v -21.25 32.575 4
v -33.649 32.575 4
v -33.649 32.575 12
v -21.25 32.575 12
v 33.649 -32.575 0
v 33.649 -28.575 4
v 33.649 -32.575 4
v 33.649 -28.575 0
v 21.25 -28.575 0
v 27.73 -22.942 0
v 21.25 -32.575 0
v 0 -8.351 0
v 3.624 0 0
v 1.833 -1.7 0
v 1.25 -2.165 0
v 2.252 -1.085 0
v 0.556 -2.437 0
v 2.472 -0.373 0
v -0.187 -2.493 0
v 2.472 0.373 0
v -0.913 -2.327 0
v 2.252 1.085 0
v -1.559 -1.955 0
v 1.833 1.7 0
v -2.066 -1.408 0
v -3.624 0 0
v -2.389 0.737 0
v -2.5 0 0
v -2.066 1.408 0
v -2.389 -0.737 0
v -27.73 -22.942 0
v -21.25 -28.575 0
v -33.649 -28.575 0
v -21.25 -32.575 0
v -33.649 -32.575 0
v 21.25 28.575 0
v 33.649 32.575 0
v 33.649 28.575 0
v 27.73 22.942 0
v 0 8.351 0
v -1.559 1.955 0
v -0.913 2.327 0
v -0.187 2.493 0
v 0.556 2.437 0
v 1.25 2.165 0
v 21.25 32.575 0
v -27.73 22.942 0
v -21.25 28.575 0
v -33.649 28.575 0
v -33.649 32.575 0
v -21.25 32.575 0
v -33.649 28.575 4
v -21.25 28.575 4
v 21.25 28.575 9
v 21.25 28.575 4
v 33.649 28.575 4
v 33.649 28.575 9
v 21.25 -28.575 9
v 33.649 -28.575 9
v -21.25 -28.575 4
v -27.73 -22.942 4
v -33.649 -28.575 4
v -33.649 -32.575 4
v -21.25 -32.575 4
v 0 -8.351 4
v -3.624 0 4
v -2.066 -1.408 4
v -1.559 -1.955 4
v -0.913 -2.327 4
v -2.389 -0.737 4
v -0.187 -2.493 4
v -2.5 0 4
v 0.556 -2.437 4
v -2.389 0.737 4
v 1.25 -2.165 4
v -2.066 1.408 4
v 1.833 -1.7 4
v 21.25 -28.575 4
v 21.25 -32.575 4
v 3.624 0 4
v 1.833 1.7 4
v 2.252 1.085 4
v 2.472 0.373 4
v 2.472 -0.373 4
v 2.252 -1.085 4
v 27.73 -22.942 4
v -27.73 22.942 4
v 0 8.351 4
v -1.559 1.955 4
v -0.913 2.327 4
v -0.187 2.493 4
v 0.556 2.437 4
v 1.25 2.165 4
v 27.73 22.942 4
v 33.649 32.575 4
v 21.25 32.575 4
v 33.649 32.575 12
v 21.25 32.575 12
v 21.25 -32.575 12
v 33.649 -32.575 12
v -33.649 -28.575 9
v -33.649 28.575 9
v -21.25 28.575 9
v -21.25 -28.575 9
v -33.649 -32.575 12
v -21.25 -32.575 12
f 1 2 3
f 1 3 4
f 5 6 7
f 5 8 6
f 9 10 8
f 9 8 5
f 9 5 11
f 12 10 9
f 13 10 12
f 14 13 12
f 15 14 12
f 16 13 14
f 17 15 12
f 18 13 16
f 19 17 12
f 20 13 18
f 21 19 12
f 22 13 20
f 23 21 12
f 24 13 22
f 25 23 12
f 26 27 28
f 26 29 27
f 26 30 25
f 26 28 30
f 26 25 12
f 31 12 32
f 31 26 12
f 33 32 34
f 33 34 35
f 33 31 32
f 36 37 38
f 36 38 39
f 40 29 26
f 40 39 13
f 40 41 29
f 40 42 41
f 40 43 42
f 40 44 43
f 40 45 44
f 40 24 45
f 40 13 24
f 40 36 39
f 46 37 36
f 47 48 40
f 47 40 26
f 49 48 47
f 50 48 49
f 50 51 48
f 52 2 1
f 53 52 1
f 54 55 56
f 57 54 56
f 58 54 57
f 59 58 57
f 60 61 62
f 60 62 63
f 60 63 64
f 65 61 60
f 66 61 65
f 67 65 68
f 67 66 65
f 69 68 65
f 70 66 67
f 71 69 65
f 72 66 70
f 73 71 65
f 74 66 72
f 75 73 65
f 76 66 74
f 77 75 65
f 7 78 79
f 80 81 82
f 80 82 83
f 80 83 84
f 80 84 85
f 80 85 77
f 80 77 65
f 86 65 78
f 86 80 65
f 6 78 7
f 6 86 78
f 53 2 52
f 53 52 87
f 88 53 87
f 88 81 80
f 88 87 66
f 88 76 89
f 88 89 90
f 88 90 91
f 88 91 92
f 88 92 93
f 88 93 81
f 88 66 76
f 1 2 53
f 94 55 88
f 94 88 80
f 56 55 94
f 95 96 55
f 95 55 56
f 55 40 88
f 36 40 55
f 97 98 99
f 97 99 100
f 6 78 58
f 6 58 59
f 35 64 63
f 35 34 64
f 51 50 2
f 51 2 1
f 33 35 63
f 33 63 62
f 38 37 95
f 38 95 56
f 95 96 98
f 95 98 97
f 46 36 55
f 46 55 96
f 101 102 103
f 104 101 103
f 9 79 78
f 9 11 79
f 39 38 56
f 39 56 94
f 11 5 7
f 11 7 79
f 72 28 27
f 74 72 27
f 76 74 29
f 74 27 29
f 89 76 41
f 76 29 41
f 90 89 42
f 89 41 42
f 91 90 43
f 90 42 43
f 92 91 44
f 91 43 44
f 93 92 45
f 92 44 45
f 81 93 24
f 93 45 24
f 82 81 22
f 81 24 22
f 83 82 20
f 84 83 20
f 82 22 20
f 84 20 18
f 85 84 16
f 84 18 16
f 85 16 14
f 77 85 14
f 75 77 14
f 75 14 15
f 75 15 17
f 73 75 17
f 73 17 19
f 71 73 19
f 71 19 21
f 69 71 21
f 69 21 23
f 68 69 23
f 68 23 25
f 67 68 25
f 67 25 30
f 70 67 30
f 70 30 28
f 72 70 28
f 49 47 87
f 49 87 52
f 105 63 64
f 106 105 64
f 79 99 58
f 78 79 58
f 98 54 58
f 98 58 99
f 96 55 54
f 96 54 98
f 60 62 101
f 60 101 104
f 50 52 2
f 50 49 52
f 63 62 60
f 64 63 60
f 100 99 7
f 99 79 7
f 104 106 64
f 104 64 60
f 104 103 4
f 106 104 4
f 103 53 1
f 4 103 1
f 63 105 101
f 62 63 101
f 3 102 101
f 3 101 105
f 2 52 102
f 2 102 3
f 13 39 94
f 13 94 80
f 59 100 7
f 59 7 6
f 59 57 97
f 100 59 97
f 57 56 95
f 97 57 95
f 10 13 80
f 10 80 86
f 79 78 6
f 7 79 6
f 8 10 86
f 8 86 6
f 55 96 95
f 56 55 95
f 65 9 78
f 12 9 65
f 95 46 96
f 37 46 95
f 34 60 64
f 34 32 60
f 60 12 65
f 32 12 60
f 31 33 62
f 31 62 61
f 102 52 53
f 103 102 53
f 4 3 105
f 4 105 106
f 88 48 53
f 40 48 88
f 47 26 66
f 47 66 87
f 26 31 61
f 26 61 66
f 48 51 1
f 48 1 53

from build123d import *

# Parameters (mm, degrees)
DODANIE_WYCI_GNI_CIE1_DEPTH = 4
SZKIC2_W                    = 12.398850507
SZKIC2_H                    = 4
DODANIE_WYCI_GNI_CIE2_DEPTH = 8
SZKIC3_W                    = 12.398850507
SZKIC3_H                    = 65.15
DODANIE_WYCI_GNI_CIE3_DEPTH = 3
SZKIC4_R                    = 2.5
WYTNIJ_WYCI_GNI_CIE1_DEPTH  = 10


with BuildPart() as part:
    # Szkic1 → Dodanie-wyciągnięcie1 (new body)
    with BuildSketch(Plane.XY):
        Polygon((21.25, -28.575), (0, -8.351140655), (-21.25, -28.575), (-21.25, -32.575), (-33.648850507, -32.575), (-33.648850507, -28.575), (-27.730490071, -22.942431105), (-3.623980395, 0), (-27.730490071, 22.942431105), (-33.648850507, 28.575), (-33.648850507, 32.575), (-21.25, 32.575), (-21.25, 28.575), (0, 8.351140655), (21.25, 28.575), (21.25, 32.575), (33.648850507, 32.575), (33.648850507, 28.575), (27.730490071, 22.942431105), (3.623980395, 0), (27.730490071, -22.942431105), (33.648850507, -28.575), (33.648850507, -32.575), (21.25, -32.575), align=None)
    extrude(amount=DODANIE_WYCI_GNI_CIE1_DEPTH)

    # Szkic2 → Dodanie-wyciągnięcie2 (add)
    with BuildSketch(Plane.XY.offset(4)):
        with Locations((-27.449425253, 30.575)):
            Rectangle(SZKIC2_W, SZKIC2_H)
        with Locations((27.449425253, 30.575)):
            Rectangle(SZKIC2_W, SZKIC2_H)
        with Locations((27.449425253, -30.575)):
            Rectangle(SZKIC2_W, SZKIC2_H)
        with Locations((-27.449425253, -30.575)):
            Rectangle(SZKIC2_W, SZKIC2_H)
    extrude(amount=DODANIE_WYCI_GNI_CIE2_DEPTH)

    # Szkic3 → Dodanie-wyciągnięcie3 (add)
    with BuildSketch(Plane.XY.offset(12)):
        with Locations((-27.449425253, 0)):
            Rectangle(SZKIC3_W, SZKIC3_H)
        with Locations((27.449425253, 0)):
            Rectangle(SZKIC3_W, SZKIC3_H)
    extrude(amount=-DODANIE_WYCI_GNI_CIE3_DEPTH)


with BuildPart() as body_2:
    # Podziel1: the piece on the far side of the plane
    add(part.part)
    split(bisect_by=Plane.XY.offset(4), keep=Keep.BOTTOM)

    # Szkic4 → Wytnij-wyciągnięcie1 (cut)
    with BuildSketch(Plane(origin=(0, 0, 0), x_dir=(-1, 0, 0), z_dir=(0, 0, -1))):
        Circle(SZKIC4_R)
    extrude(amount=-WYTNIJ_WYCI_GNI_CIE1_DEPTH, mode=Mode.SUBTRACT)


with BuildPart() as part_1:
    add(part.part)

    # Podziel1
    split(bisect_by=Plane.XY.offset(4), keep=Keep.TOP)


solid = Compound([body_2.part, part_1.part])
